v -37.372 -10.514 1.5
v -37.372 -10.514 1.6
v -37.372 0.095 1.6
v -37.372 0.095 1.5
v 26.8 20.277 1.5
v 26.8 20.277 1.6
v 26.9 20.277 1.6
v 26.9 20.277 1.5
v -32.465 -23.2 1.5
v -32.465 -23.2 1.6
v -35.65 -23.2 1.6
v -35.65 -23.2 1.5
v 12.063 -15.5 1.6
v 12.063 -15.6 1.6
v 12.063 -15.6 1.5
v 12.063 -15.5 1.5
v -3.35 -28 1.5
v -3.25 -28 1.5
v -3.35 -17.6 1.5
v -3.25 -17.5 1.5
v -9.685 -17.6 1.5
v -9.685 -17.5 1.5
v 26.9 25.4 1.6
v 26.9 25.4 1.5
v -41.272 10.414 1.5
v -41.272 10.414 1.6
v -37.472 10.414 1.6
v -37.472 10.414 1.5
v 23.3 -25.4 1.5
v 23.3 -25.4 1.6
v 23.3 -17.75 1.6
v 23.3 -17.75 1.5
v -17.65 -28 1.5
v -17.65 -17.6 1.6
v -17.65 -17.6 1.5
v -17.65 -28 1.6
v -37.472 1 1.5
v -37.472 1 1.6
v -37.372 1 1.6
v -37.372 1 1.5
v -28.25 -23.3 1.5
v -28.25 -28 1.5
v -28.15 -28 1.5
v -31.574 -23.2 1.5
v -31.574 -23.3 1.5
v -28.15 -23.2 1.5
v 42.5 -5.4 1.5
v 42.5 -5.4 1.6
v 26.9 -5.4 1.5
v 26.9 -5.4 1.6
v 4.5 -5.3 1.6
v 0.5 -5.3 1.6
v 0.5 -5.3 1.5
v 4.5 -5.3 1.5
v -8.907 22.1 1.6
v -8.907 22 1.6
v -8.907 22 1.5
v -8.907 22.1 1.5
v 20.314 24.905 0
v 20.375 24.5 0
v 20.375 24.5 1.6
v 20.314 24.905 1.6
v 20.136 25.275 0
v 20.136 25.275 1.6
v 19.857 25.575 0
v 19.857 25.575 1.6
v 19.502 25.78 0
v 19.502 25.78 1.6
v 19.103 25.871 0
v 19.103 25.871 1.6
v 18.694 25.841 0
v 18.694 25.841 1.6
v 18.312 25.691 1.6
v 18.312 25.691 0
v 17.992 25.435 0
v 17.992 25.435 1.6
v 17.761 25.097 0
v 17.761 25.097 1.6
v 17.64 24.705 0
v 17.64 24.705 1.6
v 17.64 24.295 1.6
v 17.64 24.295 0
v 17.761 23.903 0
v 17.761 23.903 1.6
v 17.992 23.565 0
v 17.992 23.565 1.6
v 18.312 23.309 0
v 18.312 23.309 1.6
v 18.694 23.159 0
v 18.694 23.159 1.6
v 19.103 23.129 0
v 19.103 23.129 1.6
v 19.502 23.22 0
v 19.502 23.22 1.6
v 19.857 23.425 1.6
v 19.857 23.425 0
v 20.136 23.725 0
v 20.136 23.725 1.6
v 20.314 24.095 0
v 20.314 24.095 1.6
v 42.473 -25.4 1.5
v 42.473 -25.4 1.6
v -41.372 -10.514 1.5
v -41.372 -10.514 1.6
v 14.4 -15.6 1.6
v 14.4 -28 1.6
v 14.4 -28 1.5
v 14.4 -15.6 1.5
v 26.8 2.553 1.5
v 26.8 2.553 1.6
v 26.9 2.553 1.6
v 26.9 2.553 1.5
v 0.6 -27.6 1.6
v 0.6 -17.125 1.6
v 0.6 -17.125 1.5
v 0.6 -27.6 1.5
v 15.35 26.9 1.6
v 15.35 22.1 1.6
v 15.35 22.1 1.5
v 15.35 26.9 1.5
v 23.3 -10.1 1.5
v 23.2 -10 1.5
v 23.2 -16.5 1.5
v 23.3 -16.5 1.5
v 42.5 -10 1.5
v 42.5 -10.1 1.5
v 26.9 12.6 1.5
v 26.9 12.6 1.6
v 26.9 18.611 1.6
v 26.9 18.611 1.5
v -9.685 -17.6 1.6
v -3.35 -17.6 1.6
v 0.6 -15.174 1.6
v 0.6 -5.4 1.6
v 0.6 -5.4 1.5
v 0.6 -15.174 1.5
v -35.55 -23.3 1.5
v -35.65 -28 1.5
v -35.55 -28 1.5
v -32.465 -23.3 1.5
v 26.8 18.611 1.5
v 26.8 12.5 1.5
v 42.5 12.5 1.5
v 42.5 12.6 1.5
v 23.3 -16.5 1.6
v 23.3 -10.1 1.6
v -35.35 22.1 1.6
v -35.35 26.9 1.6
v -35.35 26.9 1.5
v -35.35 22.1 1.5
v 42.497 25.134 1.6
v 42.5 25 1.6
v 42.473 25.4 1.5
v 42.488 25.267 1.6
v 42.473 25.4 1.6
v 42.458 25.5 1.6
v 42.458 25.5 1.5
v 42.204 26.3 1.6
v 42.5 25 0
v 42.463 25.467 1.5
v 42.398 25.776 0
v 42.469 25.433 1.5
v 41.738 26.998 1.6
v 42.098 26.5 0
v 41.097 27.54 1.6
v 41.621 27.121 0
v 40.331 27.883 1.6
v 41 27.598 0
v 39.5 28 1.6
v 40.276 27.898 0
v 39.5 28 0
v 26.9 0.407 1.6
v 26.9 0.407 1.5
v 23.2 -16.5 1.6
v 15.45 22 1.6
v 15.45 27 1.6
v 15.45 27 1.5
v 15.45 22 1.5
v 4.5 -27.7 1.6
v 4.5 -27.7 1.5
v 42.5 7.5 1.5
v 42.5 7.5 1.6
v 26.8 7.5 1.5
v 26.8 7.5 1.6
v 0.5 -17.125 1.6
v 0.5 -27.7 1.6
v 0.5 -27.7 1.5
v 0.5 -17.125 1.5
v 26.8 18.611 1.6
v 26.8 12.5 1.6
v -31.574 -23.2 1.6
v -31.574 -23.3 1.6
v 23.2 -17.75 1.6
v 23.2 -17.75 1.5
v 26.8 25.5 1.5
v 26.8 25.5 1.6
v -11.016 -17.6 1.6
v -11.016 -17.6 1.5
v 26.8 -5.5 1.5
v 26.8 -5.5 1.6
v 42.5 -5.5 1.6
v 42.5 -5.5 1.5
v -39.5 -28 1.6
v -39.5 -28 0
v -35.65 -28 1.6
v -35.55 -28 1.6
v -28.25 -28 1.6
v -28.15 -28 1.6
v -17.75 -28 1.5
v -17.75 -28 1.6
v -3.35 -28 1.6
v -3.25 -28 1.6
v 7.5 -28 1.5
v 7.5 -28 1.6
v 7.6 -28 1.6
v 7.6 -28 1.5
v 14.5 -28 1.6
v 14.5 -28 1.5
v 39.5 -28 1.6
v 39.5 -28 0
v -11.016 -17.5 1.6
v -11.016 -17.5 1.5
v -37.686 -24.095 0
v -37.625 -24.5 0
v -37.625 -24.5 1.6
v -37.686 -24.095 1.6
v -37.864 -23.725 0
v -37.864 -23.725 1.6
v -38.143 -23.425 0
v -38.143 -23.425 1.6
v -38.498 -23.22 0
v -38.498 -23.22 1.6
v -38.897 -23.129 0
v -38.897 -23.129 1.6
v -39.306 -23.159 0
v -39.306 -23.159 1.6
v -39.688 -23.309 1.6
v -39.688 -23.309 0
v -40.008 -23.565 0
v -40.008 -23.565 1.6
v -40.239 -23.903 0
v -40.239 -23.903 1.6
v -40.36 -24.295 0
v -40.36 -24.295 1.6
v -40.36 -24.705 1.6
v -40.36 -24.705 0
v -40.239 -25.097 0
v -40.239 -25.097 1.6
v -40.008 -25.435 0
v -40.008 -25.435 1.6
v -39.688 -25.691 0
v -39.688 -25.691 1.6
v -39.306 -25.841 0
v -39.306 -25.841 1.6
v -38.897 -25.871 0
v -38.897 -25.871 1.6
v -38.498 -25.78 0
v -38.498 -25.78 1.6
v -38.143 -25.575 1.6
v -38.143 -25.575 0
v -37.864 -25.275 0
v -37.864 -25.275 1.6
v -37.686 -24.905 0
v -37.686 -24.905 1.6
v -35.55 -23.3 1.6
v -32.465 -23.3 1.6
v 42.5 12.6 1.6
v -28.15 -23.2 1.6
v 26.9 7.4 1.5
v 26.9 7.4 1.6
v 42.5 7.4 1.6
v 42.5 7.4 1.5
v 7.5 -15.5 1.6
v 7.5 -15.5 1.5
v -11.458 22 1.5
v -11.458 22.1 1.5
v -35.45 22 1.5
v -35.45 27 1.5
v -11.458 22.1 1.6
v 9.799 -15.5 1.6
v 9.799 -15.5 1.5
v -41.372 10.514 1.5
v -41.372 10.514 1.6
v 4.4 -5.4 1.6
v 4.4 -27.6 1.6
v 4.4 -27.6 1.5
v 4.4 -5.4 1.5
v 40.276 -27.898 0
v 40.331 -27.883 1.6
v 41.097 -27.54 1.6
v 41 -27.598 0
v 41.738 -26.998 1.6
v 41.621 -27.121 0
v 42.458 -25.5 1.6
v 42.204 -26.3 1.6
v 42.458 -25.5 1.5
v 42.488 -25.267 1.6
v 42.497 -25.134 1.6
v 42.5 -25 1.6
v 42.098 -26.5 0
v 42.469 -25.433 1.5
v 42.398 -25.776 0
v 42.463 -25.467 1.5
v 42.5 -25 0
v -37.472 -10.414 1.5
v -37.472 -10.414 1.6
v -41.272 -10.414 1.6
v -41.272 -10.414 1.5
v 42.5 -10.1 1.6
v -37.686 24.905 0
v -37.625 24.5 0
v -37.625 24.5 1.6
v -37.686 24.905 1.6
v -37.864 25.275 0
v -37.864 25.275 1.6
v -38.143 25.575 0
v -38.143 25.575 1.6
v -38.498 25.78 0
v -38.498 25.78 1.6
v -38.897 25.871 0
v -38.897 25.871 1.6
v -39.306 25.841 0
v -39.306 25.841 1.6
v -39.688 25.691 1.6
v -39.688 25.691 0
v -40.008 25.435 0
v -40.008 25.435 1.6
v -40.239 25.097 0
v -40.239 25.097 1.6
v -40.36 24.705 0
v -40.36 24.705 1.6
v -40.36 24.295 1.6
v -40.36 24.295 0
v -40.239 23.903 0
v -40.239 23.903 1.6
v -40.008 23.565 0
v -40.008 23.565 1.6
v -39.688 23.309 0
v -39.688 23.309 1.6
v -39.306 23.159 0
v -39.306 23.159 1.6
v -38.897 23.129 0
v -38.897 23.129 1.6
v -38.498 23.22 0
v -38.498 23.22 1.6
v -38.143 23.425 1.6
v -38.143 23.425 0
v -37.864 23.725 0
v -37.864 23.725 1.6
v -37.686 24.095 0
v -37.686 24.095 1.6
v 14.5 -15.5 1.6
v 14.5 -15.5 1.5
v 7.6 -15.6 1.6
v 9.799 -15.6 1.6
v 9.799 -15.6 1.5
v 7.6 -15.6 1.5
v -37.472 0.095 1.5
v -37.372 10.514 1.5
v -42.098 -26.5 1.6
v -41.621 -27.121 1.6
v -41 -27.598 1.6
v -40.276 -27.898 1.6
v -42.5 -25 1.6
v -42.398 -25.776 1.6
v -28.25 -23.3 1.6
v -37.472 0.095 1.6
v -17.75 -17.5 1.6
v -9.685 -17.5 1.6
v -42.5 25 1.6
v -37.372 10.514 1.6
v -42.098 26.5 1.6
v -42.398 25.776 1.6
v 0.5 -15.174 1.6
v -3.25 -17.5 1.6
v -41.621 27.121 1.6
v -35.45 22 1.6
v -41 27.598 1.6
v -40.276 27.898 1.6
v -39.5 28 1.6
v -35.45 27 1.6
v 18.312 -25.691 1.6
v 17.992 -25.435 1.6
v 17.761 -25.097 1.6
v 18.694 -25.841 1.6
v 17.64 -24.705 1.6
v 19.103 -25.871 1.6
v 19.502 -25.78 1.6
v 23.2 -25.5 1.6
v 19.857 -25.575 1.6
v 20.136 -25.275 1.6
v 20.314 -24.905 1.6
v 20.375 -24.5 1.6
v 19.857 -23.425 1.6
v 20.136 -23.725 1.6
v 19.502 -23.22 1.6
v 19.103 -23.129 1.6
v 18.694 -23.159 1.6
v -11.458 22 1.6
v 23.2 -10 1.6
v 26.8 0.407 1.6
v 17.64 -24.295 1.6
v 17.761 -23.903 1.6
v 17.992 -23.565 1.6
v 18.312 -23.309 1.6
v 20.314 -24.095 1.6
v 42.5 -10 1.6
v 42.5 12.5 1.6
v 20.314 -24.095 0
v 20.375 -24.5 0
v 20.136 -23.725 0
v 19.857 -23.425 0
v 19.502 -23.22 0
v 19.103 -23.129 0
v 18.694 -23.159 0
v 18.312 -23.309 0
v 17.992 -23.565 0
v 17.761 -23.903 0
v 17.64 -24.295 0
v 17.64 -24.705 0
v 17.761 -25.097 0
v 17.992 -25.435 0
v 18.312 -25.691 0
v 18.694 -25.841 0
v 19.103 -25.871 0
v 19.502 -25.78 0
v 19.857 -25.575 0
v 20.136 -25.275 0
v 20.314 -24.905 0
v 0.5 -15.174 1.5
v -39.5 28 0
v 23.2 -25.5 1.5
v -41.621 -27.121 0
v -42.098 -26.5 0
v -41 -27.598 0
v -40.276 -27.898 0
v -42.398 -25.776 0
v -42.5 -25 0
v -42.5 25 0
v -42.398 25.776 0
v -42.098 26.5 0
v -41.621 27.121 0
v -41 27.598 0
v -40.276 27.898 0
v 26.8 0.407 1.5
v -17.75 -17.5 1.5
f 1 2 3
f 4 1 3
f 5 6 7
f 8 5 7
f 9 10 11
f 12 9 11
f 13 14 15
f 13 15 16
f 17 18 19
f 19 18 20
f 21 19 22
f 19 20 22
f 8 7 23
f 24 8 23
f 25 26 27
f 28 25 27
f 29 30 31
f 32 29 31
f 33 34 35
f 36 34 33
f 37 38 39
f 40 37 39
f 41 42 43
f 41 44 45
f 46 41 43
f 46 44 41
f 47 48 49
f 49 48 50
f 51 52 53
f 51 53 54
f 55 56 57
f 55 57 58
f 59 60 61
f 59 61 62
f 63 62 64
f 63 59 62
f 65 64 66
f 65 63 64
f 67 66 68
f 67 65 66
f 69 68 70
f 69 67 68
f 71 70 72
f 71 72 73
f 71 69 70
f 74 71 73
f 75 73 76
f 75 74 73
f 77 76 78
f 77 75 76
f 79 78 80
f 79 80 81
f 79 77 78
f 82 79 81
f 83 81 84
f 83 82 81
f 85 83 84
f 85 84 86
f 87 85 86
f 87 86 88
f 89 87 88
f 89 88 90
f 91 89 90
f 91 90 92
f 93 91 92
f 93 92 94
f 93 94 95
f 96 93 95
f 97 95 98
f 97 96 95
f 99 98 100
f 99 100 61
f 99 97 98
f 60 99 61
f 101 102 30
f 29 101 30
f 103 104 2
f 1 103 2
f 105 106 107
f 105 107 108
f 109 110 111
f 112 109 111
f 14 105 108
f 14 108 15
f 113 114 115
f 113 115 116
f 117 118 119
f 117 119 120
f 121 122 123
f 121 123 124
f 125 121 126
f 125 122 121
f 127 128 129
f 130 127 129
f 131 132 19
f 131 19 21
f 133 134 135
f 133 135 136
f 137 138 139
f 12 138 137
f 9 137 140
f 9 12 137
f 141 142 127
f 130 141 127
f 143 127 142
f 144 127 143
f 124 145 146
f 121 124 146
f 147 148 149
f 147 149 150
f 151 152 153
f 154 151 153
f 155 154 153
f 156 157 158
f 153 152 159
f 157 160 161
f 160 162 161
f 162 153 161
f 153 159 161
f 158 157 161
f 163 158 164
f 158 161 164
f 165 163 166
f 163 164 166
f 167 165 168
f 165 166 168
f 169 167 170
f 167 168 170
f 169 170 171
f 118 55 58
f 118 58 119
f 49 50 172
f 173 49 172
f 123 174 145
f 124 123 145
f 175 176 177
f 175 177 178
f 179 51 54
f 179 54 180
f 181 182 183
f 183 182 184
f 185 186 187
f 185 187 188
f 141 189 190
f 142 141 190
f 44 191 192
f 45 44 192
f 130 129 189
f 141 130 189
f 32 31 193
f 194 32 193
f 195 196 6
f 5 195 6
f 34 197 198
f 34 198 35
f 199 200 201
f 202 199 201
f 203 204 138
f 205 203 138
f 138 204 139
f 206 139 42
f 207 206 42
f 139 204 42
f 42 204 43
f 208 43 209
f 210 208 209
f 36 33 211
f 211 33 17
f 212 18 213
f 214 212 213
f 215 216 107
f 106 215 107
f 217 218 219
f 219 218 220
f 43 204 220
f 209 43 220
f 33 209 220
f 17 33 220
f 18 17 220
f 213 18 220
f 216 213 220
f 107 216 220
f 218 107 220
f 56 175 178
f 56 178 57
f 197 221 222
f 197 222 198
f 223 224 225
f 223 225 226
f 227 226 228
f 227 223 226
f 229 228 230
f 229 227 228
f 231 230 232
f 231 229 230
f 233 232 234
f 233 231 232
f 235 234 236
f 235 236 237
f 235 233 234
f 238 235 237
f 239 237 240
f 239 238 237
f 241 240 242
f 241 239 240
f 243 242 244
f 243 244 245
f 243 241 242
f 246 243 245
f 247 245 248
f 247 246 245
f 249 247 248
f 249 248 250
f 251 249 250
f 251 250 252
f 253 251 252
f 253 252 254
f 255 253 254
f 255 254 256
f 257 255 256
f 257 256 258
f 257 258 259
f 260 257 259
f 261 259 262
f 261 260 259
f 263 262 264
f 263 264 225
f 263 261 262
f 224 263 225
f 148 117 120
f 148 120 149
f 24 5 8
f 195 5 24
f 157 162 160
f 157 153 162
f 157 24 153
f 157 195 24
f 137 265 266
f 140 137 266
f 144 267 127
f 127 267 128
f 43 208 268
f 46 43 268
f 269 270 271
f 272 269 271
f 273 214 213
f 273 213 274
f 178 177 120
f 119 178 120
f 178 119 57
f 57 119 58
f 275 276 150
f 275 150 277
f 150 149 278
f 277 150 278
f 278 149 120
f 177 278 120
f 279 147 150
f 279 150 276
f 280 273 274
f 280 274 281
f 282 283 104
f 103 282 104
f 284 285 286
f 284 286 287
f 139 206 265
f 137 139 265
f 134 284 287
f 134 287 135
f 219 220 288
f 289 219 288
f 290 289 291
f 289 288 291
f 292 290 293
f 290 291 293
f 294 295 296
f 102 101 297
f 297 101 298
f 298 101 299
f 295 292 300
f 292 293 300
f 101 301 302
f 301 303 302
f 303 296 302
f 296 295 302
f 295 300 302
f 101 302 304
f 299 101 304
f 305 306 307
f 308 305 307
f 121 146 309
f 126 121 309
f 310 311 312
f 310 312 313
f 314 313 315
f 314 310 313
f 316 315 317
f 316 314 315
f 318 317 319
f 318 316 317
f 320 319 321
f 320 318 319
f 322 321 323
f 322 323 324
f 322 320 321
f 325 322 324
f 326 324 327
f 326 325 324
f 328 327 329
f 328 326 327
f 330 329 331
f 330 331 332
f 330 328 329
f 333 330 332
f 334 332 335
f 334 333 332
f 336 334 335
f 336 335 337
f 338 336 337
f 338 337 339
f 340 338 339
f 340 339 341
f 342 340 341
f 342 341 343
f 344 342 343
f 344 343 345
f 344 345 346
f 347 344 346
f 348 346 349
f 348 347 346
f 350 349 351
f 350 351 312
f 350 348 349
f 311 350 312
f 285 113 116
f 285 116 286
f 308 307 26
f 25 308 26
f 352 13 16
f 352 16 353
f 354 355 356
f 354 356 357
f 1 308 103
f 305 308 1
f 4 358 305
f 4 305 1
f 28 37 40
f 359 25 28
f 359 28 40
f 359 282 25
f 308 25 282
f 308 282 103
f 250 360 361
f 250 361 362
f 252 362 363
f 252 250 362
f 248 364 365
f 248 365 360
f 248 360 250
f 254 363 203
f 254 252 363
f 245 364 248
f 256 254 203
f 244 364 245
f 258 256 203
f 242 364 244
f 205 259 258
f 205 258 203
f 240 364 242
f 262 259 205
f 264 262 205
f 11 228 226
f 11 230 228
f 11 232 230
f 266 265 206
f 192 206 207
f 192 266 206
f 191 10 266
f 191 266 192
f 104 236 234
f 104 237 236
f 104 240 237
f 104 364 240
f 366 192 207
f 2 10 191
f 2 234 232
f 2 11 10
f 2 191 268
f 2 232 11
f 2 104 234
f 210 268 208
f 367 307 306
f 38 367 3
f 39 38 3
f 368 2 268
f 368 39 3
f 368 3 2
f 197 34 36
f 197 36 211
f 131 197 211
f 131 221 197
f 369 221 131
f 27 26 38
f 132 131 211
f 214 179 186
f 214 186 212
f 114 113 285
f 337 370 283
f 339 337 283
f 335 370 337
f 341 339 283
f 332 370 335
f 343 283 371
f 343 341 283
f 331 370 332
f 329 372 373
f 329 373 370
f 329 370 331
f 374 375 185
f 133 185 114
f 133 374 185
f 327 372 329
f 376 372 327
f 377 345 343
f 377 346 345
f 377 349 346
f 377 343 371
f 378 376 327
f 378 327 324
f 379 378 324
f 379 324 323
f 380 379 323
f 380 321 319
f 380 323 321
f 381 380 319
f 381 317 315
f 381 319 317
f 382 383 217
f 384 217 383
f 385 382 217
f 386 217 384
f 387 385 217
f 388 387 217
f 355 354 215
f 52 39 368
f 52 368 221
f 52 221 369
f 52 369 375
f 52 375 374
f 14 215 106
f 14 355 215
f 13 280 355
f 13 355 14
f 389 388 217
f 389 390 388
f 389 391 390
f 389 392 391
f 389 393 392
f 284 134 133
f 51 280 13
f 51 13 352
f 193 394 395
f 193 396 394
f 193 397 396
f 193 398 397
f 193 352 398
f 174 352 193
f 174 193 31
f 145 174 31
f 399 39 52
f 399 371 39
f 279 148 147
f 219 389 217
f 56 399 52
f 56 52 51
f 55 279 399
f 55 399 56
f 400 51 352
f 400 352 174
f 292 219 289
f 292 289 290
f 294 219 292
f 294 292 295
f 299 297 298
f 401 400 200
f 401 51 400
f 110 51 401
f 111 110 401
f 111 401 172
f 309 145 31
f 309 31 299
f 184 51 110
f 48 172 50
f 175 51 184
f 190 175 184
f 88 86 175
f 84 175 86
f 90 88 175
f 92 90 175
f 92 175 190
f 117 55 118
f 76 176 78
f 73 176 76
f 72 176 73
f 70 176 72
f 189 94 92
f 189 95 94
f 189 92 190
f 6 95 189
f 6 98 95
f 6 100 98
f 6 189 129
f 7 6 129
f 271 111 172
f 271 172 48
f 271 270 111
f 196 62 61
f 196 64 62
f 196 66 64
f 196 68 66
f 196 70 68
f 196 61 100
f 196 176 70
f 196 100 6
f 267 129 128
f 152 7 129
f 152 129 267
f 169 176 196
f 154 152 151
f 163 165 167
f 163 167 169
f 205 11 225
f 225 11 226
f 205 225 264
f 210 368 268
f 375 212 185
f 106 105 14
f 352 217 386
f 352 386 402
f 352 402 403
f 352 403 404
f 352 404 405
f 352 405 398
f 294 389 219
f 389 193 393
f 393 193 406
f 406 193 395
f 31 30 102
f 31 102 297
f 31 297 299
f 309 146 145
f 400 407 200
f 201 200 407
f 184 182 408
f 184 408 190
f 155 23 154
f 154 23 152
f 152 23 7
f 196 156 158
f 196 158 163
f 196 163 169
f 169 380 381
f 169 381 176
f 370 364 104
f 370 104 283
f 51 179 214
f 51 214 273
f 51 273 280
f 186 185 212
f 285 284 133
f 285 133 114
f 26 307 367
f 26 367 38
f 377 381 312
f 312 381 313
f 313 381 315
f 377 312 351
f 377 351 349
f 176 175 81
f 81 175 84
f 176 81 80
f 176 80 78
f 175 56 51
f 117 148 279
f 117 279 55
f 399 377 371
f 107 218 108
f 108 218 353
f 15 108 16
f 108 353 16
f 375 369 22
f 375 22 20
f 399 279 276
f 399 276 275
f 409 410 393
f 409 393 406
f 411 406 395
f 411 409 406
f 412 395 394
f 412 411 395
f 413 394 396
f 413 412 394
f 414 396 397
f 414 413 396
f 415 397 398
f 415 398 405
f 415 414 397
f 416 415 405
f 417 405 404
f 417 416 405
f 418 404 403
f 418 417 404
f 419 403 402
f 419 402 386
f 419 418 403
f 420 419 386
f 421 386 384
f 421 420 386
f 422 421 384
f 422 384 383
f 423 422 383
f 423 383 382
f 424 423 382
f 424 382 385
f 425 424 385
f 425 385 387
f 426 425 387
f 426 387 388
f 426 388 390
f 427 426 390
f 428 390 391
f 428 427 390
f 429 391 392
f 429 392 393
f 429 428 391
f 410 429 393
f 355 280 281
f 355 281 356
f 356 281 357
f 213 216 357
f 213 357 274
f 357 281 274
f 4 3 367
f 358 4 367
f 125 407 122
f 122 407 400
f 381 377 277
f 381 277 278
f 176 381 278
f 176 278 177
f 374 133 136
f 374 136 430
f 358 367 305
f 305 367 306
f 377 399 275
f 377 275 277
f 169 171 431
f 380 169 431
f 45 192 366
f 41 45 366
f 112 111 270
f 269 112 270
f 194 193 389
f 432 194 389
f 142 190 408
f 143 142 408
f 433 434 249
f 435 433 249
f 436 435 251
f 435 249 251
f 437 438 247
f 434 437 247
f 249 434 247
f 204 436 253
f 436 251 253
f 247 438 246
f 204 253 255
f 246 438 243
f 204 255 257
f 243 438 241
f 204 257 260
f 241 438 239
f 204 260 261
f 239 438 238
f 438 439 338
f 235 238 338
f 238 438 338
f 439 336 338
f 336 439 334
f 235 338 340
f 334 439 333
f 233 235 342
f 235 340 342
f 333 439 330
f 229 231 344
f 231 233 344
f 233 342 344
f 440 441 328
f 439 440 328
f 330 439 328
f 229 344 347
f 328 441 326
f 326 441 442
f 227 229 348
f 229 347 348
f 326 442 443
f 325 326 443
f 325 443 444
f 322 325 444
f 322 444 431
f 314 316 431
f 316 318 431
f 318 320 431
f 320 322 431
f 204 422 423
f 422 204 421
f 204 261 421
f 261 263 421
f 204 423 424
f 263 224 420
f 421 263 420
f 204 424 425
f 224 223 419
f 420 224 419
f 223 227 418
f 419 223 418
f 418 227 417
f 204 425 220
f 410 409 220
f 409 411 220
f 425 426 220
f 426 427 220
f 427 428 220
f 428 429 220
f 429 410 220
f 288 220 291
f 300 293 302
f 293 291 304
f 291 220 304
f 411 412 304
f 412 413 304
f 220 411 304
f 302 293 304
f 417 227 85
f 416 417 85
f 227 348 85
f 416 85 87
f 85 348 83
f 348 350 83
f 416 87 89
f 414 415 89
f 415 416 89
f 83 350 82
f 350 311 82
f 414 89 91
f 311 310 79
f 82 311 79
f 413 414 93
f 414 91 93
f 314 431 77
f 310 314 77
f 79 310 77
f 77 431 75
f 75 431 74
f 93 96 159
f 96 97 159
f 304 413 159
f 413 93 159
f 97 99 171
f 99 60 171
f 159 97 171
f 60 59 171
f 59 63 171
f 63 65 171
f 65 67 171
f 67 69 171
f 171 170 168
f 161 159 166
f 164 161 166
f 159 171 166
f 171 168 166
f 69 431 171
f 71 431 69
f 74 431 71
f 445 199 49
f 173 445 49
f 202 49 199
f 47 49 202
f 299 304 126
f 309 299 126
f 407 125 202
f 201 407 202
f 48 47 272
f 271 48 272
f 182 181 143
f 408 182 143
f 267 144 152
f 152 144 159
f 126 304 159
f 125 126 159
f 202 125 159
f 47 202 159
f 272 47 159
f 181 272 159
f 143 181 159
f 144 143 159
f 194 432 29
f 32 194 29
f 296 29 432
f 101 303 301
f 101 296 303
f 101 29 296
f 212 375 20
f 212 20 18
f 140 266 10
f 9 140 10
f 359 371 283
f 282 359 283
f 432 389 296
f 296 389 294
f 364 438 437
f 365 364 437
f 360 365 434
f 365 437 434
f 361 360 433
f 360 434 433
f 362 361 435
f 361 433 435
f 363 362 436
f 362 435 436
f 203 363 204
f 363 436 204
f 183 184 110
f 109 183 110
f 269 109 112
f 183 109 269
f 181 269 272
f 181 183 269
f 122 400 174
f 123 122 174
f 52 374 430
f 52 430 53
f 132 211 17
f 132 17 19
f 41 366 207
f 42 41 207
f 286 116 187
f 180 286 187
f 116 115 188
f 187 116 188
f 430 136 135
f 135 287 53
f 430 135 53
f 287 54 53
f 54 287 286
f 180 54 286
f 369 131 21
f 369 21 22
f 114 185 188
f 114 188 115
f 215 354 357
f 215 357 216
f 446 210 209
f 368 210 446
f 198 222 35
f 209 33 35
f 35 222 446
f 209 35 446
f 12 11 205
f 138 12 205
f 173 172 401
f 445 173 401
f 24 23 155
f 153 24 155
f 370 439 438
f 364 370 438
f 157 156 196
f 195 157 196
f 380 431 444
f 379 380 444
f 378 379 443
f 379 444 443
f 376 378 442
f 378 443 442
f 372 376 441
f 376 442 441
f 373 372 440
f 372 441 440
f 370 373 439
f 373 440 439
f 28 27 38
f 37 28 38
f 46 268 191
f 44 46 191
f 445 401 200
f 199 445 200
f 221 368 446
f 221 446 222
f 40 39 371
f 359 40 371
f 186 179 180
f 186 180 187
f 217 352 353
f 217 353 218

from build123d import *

# Parameters (mm, degrees)
SKETCH1_R           = 1.375
BOSS_EXTRUDE1_DEPTH = 1.6
CUT_EXTRUDE1_DEPTH  = 0.1


with BuildPart() as part:
    # Sketch1 → Boss-Extrude1 (new body)
    with BuildSketch(Plane.XY):
        with BuildLine():
            Line((-39.5, -28), (39.5, -28))
            ThreePointArc((39.5, -28), (41.621320344, -27.121320344), (42.5, -25))
            Line((42.5, -25), (42.5, 25))
            ThreePointArc((42.5, 25), (41.621320344, 27.121320344), (39.5, 28))
            Line((39.5, 28), (-39.5, 28))
            ThreePointArc((-39.5, 28), (-41.621320344, 27.121320344), (-42.5, 25))
            Line((-42.5, 25), (-42.5, -25))
            ThreePointArc((-42.5, -25), (-41.621320344, -27.121320344), (-39.5, -28))
        make_face()
        with Locations((-39, 24.5)):
            Circle(SKETCH1_R, mode=Mode.SUBTRACT)
        with Locations((-39, -24.5)):
            Circle(SKETCH1_R, mode=Mode.SUBTRACT)
        with Locations((19, 24.5)):
            Circle(SKETCH1_R, mode=Mode.SUBTRACT)
        with Locations((19, -24.5)):
            Circle(SKETCH1_R, mode=Mode.SUBTRACT)
    extrude(amount=BOSS_EXTRUDE1_DEPTH)

    # Sketch2 → Cut-Extrude1 (cut)
    with BuildSketch(Plane.XY.offset(1.6)):
        Polygon((-35.65, -28.636850855), (-28.15, -28.636850855), (-28.15, -23.2), (-31.573707352, -23.2), (-31.573707352, -23.3), (-28.25, -23.3), (-28.25, -28.536850855), (-35.55, -28.536850855), (-35.55, -23.3), (-32.465045999, -23.3), (-32.465045999, -23.2), (-35.65, -23.2), align=None)
        Polygon((-17.75, -17.5), (-11.015830732, -17.5), (-11.015830732, -17.6), (-17.65, -17.6), (-17.65, -33.061376344), (-3.35, -33.061376344), (-3.35, -17.6), (-9.684859924, -17.6), (-9.684859924, -17.5), (-3.25, -17.5), (-3.25, -33.161376344), (-17.75, -33.161376344), align=None)
        Polygon((0.5, -5.3), (4.5, -5.3), (4.5, -27.7), (0.5, -27.7), (0.5, -17.125), (0.6, -17.125), (0.6, -27.6), (4.4, -27.6), (4.4, -5.4), (0.6, -5.4), (0.6, -15.17398131), (0.5, -15.17398131), align=None)
        Polygon((7.5, -15.5), (9.799158316, -15.5), (9.799158316, -15.6), (7.6, -15.6), (7.6, -31.061376344), (14.4, -31.061376344), (14.4, -15.6), (12.062610562, -15.6), (12.062610562, -15.5), (14.5, -15.5), (14.5, -31.161376344), (7.5, -31.161376344), align=None)
        Polygon((-35.45, 27), (15.45, 27), (15.45, 22), (-8.906687942, 22), (-8.906687942, 22.1), (15.35, 22.1), (15.35, 26.9), (-35.35, 26.9), (-35.35, 22.1), (-11.458179647, 22.1), (-11.458179647, 22), (-35.45, 22), align=None)
        Polygon((-41.371710411, -10.514157593), (-37.371710411, -10.514157593), (-37.371710411, 0.094714316), (-37.471710411, 0.094714316), (-37.471710411, -10.414157593), (-41.271710411, -10.414157593), (-41.271710411, 10.414157593), (-37.471710411, 10.414157593), (-37.471710411, 1), (-37.371710411, 1), (-37.371710411, 10.514157593), (-41.371710411, 10.514157593), align=None)
        Polygon((23.2, -25.5), (44.7, -25.5), (44.7, -10), (23.2, -10), (23.2, -16.5), (23.3, -16.5), (23.3, -10.1), (44.6, -10.1), (44.6, -25.4), (23.3, -25.4), (23.3, -17.75), (23.2, -17.75), align=None)
        Polygon((26.8, -5.5), (54.071370237, -5.5), (54.071370237, 7.5), (26.8, 7.5), (26.8, 2.552788505), (26.9, 2.552788505), (26.9, 7.4), (53.971370237, 7.4), (53.971370237, -5.4), (26.9, -5.4), (26.9, 0.407211154), (26.8, 0.407211154), align=None)
        Polygon((26.8, 12.5), (57.71374017, 12.5), (57.71374017, 25.5), (26.8, 25.5), (26.8, 20.277341759), (26.9, 20.277341759), (26.9, 25.4), (57.61374017, 25.4), (57.61374017, 12.6), (26.9, 12.6), (26.9, 18.611308355), (26.8, 18.611308355), align=None)
    extrude(amount=-CUT_EXTRUDE1_DEPTH, mode=Mode.SUBTRACT)


solid = part.part
